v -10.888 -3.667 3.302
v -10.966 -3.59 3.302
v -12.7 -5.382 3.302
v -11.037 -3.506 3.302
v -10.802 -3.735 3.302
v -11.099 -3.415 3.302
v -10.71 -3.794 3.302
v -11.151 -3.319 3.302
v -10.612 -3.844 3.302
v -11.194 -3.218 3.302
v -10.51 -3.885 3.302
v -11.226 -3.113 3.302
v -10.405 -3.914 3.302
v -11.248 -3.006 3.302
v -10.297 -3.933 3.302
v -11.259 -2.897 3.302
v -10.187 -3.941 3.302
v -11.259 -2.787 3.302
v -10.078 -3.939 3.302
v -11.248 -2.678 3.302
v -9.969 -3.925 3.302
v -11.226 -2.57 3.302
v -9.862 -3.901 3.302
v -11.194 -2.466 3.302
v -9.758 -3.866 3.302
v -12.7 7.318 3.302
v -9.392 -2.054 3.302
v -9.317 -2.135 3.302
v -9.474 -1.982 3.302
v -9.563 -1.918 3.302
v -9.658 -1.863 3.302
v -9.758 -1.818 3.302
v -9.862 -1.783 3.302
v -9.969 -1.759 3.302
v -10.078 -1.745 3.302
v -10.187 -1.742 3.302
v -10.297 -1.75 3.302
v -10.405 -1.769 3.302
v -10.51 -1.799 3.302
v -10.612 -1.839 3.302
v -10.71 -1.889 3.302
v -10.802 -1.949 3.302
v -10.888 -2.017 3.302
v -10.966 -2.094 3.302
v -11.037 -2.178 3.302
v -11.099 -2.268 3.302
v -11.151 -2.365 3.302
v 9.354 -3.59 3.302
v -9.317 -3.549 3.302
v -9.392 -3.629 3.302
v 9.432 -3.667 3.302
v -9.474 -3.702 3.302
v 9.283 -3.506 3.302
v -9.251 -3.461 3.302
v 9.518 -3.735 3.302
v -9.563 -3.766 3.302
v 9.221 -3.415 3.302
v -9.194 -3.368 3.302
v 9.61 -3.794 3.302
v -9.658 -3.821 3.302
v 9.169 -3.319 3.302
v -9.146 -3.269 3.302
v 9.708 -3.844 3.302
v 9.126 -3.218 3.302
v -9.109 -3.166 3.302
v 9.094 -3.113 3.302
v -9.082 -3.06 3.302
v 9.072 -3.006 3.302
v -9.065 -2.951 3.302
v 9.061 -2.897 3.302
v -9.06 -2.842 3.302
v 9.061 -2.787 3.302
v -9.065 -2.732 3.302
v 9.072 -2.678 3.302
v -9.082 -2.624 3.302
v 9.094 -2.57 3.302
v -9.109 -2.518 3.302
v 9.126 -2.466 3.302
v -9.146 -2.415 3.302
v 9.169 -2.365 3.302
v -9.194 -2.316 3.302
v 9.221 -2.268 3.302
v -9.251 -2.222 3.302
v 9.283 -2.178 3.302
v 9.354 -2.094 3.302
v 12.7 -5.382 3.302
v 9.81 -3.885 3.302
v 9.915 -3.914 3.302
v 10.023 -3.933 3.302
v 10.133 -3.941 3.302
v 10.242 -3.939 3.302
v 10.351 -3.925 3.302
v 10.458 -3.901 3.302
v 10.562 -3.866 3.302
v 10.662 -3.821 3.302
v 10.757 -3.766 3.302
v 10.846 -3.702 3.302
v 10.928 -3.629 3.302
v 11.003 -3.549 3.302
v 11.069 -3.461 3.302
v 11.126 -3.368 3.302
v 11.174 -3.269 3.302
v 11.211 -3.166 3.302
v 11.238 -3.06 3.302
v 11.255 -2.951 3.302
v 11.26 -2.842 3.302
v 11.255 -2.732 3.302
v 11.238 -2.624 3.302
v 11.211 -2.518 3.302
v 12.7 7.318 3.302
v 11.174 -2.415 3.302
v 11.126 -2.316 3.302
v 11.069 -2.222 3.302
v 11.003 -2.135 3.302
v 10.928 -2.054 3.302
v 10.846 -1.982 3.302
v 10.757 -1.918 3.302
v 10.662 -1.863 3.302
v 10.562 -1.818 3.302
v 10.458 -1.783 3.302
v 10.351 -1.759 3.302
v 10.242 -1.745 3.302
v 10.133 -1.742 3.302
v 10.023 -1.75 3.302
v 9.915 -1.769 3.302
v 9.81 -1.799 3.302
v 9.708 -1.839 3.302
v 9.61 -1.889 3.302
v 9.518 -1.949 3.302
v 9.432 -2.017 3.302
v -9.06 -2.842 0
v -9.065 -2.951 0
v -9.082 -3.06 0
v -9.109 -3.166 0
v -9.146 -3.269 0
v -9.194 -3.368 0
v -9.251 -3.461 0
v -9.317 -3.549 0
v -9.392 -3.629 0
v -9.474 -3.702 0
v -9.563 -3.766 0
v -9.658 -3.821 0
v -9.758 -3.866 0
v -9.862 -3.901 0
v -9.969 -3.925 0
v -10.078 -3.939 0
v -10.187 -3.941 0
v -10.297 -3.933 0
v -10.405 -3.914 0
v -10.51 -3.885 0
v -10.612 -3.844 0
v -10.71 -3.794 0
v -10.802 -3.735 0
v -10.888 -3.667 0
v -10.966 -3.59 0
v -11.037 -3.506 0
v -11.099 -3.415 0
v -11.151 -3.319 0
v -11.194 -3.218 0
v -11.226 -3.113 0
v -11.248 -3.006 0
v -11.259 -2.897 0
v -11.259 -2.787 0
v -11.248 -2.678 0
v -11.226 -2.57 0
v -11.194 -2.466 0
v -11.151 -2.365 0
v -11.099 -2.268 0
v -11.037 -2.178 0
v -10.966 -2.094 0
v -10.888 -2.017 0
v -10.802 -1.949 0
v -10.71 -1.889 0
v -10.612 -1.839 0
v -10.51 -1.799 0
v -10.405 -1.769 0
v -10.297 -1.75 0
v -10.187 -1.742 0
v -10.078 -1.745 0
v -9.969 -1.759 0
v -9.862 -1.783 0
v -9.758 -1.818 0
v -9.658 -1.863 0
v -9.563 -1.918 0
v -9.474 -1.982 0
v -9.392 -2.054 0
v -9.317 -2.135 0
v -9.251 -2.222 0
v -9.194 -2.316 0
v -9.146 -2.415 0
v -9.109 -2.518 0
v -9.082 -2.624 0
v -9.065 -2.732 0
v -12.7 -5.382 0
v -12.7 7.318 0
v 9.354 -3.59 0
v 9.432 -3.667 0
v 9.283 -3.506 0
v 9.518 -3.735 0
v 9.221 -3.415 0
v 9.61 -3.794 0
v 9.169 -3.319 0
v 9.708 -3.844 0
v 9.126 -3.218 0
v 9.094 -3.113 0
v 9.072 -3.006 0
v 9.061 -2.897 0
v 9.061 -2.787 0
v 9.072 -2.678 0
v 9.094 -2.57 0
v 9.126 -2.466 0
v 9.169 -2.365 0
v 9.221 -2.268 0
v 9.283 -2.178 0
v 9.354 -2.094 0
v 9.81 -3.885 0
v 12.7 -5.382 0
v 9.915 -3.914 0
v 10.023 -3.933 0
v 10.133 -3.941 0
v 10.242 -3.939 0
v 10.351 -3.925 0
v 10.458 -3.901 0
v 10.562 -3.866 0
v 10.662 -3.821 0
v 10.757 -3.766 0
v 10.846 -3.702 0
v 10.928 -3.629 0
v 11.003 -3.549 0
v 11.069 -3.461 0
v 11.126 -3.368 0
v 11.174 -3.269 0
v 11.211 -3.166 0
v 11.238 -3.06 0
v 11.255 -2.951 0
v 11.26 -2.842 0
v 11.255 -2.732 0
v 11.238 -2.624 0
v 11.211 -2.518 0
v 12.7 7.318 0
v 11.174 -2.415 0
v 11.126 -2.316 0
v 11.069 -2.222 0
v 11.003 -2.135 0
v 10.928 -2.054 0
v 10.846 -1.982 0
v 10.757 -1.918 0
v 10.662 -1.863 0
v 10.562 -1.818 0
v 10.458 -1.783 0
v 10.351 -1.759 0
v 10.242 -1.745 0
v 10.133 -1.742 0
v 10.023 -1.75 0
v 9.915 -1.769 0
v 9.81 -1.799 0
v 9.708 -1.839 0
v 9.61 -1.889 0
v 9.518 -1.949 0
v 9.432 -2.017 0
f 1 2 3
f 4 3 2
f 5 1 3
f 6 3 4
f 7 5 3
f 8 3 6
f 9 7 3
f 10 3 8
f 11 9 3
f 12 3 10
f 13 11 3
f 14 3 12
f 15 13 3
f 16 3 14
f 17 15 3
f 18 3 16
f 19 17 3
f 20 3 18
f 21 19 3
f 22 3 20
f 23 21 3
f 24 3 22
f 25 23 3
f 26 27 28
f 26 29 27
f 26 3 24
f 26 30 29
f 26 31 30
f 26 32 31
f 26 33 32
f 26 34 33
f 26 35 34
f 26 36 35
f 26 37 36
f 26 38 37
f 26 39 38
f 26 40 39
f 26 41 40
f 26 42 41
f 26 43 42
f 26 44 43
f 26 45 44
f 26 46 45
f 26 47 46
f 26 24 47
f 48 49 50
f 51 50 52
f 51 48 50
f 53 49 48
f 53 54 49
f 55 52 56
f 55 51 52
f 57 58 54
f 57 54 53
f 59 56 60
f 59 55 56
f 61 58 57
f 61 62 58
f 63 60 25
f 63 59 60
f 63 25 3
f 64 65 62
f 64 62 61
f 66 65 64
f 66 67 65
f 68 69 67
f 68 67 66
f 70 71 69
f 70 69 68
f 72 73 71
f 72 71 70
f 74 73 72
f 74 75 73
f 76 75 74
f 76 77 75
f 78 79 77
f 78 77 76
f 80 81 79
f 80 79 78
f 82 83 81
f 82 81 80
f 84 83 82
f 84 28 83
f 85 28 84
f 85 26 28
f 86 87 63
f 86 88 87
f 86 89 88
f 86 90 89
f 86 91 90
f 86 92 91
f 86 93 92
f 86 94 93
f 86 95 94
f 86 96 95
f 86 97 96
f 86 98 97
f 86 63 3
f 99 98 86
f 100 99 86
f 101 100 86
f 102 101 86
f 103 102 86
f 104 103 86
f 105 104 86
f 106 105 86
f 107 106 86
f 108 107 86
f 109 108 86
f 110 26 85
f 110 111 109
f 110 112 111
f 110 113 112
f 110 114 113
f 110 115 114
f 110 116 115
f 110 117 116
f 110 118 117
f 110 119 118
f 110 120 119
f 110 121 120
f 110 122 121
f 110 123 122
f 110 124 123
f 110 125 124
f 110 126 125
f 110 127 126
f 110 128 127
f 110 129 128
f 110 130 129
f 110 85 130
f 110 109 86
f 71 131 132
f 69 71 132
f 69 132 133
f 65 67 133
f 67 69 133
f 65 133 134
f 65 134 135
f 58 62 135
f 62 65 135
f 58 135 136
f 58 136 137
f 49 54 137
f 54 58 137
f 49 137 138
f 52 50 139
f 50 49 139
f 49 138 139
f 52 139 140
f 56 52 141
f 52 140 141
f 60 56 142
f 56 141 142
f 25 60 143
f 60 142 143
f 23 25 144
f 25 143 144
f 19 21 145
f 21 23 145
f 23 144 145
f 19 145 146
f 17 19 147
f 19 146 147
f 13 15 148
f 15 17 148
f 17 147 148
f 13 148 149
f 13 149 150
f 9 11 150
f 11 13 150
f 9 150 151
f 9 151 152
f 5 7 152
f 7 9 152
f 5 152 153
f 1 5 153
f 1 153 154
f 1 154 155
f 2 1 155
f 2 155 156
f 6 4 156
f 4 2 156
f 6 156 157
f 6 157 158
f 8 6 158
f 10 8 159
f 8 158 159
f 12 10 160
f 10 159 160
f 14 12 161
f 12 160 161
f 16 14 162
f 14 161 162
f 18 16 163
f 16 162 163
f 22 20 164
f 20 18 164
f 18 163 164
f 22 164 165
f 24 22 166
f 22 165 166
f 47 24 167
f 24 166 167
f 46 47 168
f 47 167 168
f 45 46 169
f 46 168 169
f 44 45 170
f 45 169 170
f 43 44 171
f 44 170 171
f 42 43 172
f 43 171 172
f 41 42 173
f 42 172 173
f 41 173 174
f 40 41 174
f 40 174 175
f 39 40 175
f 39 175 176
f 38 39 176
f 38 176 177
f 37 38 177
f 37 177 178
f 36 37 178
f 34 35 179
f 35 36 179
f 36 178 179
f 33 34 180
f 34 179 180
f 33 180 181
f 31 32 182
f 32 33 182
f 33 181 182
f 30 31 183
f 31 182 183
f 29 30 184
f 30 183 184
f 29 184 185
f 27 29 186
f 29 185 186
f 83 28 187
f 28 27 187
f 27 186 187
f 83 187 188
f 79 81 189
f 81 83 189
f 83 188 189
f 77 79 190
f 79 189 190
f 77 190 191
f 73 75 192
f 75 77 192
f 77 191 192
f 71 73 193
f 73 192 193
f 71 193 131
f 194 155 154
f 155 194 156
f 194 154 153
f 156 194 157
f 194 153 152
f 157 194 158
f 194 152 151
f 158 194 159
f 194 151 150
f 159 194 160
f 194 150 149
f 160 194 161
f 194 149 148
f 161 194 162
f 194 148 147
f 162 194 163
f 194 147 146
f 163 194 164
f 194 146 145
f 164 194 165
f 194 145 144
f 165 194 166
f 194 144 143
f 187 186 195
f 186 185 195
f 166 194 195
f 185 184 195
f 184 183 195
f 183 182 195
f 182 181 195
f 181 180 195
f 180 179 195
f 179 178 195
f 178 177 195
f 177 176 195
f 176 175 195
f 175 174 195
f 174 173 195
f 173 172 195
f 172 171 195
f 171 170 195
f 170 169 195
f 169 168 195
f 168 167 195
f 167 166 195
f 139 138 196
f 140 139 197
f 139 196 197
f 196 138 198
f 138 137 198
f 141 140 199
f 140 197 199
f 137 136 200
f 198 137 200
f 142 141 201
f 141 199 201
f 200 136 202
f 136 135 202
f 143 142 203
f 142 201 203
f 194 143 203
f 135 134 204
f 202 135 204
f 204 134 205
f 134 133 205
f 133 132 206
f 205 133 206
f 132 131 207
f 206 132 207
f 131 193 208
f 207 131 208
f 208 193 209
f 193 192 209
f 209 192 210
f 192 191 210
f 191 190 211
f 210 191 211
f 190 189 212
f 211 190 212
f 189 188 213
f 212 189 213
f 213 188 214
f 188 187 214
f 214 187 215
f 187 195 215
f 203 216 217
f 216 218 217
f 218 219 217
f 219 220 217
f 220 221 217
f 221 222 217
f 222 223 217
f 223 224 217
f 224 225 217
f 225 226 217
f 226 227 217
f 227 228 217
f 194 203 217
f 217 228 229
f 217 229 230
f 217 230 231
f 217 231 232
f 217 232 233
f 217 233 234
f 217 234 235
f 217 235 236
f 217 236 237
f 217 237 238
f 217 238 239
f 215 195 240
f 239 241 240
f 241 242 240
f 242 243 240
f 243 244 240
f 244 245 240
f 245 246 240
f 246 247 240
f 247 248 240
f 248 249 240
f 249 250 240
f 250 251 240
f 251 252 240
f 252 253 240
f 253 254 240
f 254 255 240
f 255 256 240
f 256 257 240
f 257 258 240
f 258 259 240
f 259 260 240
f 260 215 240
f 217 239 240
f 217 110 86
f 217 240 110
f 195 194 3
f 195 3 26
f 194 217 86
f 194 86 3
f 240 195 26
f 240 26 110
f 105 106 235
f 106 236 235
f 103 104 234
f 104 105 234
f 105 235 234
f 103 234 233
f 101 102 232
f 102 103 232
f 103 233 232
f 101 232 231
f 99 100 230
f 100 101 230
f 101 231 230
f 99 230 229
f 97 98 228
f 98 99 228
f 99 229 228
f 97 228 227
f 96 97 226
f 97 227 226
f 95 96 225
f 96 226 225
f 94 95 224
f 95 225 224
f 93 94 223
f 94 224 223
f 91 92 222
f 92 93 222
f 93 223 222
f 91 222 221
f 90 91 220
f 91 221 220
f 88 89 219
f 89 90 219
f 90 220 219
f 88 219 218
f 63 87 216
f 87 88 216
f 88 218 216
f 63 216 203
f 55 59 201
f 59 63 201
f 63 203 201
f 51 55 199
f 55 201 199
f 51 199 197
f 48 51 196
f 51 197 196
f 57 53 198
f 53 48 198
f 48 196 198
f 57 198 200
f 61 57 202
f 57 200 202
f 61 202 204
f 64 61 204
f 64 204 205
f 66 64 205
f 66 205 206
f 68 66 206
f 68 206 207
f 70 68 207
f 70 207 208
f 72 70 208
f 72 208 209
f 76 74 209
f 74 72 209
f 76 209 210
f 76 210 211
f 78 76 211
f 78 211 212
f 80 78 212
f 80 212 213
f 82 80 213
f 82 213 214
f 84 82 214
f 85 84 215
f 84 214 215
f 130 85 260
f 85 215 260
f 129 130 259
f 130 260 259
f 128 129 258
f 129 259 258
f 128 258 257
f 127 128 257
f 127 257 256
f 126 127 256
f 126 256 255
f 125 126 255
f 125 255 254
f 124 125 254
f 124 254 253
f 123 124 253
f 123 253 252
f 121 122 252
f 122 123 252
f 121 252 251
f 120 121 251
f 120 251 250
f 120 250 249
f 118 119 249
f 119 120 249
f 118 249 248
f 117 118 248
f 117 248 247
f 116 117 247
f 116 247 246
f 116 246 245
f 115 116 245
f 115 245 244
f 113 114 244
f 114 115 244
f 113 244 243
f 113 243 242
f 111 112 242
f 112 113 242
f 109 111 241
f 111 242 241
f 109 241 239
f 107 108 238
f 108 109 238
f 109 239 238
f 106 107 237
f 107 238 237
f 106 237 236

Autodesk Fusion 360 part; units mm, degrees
sketch "Sketch1" plane through (0, 0, 0) normal (0, 0, 1) x (1, 0, 0)
  line L0 (-12.7, 7.3182) -> (12.7, 7.3182)
  line L1 (12.7, 7.3182) -> (12.7, -5.3818)
  line L2 (12.7, -5.3818) -> (-12.7, -5.3818)
  line L3 (-12.7, -5.3818) -> (-12.7, 7.3182)
  circle A0 centre (-10.16, -2.8418) radius 1.1
  circle A1 centre (10.16, -2.8418) radius 1.1
  dimension "d1" = 25.4
  dimension "d2" = 12.7
  dimension "d3" = 2.2
  dimension "d4" = 2.2
  dimension "d5" = 20.32
  dimension "d6" = 2.54
  dimension "d7" = 2.54
  dimension "d8" = 2.54
extrude "Extrude1" add sketch "Sketch1" along normal blind 6.35
extrude "Extrude2" cut 1 faces at (3.1179, 4.1809, 6.35) along direction (0, 0, -1) blind 3.048
